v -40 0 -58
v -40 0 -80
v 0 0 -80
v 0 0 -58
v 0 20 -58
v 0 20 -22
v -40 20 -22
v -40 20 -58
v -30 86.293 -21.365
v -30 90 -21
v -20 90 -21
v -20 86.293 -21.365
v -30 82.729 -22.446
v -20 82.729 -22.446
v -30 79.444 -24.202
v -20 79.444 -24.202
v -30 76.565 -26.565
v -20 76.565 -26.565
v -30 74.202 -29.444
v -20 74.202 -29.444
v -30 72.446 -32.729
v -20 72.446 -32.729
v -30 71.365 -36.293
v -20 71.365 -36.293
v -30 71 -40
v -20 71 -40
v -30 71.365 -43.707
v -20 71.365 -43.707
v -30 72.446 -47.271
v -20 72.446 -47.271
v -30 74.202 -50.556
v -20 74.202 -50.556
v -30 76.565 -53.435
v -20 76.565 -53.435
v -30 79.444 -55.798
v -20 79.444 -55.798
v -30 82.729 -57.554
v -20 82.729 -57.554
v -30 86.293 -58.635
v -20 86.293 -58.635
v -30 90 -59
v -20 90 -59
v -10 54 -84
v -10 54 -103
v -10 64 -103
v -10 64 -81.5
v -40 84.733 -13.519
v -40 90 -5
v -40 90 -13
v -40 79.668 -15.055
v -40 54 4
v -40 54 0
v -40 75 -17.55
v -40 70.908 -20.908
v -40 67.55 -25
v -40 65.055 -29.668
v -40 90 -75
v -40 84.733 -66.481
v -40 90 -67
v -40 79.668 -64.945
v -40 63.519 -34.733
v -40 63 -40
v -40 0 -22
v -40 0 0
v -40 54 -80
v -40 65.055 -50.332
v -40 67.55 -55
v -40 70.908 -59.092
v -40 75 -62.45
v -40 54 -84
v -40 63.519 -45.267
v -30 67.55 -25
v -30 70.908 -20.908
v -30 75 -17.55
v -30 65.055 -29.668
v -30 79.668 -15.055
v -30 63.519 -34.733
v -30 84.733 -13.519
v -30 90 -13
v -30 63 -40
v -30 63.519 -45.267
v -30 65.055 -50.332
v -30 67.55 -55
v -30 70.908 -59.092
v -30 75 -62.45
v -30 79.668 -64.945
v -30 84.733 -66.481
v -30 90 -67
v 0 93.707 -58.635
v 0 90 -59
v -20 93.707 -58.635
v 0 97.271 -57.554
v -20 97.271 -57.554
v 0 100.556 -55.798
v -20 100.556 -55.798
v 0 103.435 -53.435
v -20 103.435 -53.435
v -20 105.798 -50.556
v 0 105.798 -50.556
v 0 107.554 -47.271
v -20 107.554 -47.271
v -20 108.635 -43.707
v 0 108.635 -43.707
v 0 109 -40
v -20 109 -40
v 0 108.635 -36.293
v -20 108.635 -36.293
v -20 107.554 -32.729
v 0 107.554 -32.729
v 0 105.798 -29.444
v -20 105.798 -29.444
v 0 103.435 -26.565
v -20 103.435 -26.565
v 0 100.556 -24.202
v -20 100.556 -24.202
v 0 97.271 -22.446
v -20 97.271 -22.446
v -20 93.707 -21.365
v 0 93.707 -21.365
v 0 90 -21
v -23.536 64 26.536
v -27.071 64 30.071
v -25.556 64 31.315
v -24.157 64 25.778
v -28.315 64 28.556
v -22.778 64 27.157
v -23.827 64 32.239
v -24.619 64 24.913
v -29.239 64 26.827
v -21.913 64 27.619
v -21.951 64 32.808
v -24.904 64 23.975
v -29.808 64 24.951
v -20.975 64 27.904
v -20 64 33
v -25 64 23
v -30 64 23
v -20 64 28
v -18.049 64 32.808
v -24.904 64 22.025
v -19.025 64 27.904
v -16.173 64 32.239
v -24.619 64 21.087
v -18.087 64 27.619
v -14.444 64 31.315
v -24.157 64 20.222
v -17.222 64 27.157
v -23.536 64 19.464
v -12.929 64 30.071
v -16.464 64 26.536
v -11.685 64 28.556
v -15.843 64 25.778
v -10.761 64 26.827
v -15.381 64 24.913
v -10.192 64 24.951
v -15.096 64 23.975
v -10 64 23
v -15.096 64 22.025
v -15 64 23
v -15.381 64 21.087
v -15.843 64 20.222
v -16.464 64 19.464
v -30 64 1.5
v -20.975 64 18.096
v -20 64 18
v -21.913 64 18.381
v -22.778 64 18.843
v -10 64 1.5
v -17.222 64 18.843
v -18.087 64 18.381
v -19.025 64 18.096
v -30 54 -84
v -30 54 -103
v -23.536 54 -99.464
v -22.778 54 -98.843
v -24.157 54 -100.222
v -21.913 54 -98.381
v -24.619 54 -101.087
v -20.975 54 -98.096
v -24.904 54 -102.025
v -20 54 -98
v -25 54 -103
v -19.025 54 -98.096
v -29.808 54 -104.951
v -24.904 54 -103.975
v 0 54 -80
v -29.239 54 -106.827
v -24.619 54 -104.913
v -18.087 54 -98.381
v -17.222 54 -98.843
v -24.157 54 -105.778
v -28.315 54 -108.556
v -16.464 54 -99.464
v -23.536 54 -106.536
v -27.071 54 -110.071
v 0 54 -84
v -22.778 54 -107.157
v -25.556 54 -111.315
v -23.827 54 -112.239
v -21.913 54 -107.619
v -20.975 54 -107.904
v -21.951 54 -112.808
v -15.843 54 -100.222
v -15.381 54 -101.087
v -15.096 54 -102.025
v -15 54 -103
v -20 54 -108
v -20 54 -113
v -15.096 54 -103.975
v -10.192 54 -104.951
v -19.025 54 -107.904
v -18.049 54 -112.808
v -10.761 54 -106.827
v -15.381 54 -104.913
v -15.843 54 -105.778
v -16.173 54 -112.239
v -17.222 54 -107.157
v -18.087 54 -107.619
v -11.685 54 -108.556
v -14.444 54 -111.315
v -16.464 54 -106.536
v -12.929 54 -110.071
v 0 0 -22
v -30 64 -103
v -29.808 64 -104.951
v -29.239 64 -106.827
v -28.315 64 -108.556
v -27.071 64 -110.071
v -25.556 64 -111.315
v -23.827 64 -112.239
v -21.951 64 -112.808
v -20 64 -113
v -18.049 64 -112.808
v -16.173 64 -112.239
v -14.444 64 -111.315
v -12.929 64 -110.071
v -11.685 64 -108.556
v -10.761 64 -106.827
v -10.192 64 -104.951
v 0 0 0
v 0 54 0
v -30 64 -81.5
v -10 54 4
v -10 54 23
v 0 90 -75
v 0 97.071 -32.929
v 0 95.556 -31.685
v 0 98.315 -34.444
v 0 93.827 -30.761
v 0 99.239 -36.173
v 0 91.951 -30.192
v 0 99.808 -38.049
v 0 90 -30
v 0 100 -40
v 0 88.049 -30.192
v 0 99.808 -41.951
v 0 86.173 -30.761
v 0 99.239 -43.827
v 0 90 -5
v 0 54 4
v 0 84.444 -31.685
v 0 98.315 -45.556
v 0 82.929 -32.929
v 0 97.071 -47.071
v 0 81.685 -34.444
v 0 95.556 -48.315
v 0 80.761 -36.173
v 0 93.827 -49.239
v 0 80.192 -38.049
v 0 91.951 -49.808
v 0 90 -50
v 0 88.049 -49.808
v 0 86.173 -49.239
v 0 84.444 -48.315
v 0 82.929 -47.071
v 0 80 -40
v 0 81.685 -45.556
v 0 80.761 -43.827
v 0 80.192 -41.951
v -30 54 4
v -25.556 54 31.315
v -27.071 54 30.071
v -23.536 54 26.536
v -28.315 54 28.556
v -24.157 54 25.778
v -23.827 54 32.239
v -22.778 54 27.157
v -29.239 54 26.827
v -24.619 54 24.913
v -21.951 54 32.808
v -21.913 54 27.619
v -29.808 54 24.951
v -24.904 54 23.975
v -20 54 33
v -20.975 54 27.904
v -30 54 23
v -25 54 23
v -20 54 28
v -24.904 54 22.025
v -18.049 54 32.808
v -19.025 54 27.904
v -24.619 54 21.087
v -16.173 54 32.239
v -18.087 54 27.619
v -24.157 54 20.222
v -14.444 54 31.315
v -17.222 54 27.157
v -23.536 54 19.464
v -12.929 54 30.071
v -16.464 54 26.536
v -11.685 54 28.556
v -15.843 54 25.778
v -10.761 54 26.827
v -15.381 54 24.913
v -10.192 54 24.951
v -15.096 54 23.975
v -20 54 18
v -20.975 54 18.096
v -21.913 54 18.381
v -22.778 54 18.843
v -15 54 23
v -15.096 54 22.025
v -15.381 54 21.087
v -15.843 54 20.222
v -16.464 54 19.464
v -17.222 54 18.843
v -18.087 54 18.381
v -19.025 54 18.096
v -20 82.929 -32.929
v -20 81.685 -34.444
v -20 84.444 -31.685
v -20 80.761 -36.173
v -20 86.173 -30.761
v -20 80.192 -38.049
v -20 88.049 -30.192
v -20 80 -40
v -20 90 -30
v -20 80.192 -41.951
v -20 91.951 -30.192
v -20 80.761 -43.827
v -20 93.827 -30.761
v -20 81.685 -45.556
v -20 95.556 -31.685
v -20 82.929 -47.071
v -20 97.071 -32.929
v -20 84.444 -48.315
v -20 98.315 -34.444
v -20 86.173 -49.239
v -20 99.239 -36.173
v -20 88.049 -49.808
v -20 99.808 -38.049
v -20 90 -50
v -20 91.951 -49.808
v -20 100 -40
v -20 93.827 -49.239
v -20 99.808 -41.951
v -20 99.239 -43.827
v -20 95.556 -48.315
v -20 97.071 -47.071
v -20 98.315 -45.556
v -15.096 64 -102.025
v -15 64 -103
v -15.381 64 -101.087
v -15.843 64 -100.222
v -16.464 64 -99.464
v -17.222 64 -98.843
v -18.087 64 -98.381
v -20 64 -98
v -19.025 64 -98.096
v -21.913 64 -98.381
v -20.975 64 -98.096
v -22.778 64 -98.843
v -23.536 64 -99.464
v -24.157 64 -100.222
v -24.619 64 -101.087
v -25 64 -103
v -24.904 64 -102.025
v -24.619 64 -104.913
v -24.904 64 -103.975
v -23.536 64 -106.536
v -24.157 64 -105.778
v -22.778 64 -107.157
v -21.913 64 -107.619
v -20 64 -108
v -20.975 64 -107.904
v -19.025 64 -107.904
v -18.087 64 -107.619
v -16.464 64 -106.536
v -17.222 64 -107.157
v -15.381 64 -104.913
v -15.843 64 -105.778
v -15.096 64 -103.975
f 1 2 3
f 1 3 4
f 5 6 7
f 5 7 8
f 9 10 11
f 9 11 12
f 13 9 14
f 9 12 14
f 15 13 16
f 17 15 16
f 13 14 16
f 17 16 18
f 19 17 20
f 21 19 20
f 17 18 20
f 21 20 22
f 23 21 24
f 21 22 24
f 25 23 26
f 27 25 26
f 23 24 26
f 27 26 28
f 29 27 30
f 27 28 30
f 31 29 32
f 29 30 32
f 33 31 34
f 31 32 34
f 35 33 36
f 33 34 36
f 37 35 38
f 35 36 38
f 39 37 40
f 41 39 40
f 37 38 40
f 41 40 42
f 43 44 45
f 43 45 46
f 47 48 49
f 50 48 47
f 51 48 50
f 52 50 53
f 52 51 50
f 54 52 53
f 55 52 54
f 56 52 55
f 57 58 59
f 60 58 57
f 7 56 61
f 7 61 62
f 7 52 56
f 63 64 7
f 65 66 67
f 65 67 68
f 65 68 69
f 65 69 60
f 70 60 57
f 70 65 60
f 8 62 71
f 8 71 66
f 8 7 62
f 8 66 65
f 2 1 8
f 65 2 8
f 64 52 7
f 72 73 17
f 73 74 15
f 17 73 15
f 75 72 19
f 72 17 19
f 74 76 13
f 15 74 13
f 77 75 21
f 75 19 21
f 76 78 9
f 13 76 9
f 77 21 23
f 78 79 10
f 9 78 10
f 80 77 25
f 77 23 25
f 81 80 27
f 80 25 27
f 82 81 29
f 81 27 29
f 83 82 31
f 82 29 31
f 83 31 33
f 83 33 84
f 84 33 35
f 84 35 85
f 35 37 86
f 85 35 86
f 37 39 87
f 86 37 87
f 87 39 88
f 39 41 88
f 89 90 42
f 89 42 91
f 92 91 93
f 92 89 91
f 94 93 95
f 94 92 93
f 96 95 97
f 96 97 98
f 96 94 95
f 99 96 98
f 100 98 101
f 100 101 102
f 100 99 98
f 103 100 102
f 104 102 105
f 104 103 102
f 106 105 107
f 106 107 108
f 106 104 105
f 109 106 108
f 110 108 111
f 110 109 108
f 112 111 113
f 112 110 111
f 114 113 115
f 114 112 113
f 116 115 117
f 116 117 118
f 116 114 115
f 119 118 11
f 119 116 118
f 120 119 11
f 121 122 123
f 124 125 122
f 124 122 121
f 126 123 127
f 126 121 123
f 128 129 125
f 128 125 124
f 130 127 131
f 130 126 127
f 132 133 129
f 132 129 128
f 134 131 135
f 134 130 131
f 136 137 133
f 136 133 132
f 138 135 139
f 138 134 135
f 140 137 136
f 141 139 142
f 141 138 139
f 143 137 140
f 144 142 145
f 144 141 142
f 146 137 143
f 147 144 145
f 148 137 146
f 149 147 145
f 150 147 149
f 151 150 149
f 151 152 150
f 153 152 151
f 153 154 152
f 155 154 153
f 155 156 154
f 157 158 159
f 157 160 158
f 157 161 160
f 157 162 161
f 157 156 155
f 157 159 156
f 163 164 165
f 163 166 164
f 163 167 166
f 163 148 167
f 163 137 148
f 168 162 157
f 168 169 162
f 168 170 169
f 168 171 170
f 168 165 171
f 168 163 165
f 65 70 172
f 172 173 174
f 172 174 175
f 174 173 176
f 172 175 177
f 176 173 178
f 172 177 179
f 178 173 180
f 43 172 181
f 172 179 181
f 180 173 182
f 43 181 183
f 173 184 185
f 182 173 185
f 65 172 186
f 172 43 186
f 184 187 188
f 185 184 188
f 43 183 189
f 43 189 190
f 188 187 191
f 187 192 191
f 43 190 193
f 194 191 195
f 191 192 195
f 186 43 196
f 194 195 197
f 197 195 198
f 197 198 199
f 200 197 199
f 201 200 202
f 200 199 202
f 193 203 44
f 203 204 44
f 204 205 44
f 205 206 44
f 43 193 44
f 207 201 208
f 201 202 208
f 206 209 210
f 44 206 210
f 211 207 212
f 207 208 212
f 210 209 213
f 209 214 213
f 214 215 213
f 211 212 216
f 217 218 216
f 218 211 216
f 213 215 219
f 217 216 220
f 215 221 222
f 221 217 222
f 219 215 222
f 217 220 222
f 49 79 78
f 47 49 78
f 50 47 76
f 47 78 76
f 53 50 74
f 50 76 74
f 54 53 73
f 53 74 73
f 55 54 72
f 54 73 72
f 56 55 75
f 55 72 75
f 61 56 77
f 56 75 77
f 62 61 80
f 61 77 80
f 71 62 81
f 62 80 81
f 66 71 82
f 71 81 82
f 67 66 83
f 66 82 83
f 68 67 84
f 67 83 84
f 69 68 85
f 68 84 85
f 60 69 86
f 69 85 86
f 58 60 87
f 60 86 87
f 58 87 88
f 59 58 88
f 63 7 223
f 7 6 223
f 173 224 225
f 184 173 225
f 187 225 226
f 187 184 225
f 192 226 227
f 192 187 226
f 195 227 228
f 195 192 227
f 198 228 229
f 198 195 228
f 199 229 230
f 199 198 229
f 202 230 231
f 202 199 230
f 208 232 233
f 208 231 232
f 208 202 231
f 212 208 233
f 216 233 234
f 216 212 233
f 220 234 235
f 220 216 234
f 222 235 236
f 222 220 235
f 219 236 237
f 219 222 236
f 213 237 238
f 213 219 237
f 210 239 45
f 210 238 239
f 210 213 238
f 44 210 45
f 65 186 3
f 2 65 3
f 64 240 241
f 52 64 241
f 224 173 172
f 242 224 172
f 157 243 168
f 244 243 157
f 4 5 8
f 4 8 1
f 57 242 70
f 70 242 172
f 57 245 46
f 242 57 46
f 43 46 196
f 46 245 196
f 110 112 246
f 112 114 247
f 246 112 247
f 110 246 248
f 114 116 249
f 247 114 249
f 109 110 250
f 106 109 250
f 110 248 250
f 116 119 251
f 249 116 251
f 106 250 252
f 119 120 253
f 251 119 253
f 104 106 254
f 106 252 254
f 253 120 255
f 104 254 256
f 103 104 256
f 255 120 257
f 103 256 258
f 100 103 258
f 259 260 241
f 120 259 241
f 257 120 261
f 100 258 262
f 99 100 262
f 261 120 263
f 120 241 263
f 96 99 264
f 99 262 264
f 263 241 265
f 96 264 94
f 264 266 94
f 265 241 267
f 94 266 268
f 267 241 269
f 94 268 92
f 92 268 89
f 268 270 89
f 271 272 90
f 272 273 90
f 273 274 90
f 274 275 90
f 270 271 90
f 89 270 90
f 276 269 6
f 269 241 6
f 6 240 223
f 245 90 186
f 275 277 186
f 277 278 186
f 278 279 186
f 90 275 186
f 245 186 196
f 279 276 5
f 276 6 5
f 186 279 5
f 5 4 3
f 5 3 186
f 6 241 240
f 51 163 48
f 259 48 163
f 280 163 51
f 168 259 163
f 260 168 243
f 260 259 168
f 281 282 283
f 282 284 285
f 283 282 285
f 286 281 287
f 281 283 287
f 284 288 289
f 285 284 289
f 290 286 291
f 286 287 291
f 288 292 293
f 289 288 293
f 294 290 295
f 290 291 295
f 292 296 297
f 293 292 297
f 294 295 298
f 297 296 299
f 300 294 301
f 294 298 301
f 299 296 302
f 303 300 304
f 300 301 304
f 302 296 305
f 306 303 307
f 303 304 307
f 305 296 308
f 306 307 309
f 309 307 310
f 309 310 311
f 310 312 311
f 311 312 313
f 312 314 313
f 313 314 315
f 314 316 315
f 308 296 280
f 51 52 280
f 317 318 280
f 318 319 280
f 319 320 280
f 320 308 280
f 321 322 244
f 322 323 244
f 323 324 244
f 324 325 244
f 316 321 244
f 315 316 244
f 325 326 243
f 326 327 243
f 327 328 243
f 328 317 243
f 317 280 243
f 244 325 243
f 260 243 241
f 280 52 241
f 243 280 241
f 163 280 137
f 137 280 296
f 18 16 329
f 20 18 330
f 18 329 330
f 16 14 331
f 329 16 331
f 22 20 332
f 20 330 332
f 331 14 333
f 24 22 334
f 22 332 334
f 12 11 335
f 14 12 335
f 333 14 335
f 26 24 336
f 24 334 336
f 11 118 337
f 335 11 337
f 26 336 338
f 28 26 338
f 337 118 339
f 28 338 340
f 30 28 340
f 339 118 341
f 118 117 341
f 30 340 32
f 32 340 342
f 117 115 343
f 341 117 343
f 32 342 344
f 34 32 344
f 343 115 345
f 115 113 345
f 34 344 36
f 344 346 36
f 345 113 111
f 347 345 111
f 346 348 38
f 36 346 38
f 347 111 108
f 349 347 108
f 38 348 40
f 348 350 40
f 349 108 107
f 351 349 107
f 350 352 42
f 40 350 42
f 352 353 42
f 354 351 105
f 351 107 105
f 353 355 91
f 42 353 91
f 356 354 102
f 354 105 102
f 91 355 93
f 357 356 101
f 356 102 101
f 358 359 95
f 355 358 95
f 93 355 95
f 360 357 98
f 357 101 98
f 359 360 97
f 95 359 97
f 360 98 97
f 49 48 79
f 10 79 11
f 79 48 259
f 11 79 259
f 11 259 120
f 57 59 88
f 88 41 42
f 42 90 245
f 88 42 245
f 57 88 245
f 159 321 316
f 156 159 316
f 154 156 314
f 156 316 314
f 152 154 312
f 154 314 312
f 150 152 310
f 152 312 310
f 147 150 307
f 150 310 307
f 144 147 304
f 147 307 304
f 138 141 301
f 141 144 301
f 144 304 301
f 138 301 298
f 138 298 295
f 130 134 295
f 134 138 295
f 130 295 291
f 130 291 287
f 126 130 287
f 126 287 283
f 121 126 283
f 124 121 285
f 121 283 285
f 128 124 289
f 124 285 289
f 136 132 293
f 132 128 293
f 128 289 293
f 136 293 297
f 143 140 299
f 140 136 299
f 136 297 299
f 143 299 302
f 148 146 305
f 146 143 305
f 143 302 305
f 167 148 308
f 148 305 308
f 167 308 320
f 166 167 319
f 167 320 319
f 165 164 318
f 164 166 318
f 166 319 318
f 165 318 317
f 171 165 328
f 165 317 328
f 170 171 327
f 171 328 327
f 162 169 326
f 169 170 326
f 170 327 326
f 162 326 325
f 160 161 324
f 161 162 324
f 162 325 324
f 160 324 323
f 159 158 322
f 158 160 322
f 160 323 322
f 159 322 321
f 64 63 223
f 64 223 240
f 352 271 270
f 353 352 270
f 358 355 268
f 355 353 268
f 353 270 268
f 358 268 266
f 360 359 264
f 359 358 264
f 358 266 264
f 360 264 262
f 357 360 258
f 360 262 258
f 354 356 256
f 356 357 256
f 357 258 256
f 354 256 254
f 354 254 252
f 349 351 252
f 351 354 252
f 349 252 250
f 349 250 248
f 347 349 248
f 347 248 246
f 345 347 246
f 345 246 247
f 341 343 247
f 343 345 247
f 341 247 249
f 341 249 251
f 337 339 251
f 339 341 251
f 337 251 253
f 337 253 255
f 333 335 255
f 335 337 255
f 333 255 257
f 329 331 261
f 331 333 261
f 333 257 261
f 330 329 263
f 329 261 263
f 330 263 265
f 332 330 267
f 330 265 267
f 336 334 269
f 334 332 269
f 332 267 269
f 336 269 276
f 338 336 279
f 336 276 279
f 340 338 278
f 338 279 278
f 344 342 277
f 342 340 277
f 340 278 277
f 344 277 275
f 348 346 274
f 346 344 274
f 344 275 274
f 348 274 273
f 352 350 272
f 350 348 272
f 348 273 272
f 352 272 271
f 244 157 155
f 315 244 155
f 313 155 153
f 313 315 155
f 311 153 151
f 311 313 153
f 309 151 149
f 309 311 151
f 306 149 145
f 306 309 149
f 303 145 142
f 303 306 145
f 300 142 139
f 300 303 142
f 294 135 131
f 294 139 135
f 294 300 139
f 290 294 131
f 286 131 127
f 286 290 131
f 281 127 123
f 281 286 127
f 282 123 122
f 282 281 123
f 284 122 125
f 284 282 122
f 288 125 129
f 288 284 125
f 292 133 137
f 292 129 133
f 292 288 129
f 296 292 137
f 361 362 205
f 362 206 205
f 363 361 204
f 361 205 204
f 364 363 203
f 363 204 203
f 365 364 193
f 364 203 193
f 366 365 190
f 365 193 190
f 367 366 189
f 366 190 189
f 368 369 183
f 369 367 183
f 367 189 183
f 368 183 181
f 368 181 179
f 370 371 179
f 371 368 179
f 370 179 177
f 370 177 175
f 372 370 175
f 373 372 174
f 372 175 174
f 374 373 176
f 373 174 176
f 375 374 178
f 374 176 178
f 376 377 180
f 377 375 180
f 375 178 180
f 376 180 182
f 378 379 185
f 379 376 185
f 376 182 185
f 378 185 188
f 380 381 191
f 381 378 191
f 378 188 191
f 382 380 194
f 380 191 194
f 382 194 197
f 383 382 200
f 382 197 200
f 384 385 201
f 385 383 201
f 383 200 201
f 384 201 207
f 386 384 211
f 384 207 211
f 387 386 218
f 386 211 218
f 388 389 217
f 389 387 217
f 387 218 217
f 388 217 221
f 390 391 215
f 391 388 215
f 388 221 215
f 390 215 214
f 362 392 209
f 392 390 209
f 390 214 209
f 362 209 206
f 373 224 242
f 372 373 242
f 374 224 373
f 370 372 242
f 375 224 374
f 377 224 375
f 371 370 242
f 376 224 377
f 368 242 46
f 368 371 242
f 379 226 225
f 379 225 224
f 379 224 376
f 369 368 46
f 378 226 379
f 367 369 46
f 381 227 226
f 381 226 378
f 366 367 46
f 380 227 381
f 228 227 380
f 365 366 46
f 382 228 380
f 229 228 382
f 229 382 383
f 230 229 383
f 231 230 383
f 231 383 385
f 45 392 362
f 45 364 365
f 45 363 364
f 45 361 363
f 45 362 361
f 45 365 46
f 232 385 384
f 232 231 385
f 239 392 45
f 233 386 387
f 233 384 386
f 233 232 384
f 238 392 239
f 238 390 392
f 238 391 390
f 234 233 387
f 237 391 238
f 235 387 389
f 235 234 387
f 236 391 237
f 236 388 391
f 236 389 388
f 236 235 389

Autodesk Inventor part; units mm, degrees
ref_plane "YZ Plane" through (0, 0, 0) normal (1, 0, 0) x (0, 1, 0)
ref_plane "XZ Plane" through (0, 0, 0) normal (0, 1, 0) x (-1, 0, 0)
ref_plane "XY Plane" through (0, 0, 0) normal (0, 0, 1) x (1, 0, 0)
sketch "Sketch1" plane through (0, 0, 0) normal (1, 0, 0) x (0, 1, 0)
  line L0 (0, 0) -> (54, 0)
  line L1 (54, 0) -> (54, -80)
  line L2 (54, -80) -> (0, -80)
  line L3 (0, -80) -> (0, 0)
  dimension "d0" = 80
  dimension "d1" = 54
extrude "Extrusion1" add sketch "Sketch1" against normal blind 40
sketch "Sketch2" plane through (0, 0, 0) normal (1, 0, 0) x (0, 0, -1)
  line L0 (22, 20) -> (58, 20)
  line L1 (0, 0) -> (80, 0) projected
  line L2 (0, 54) -> (80, 54) projected
  line L3 (40, 54) -> (40, 0)
  line L4 (22, 20) -> (22, 0)
  line L5 (58, 20) -> (58, 0)
  line L6 (22, 0) -> (58, 0)
  line L7 (80, 0) -> (0, 0) projected
  point P0 (40, 20)
  dimension "d4" = 36
  dimension "d5" = 20
extrude "Extrusion2" cut sketch "Sketch2" against normal blind 40
sketch "Sketch3" plane through (0, 54, 0) normal (0, 1, 0) x (1, 0, 0)
  line L0 (-40, 58) -> (-40, 22) projected
  line L1 (-40, 40) -> (0, 40)
  line L2 (0, 22) -> (0, 58) projected
  line L3 (0, 0) -> (-40, 0) projected
  line L4 (-20, 0) -> (-20, 80) construction
  line L5 (0, 80) -> (-40, 80) projected
  circle A0 centre (-20, 103) radius 5
  arc A1 (-10, 103) -> (-30, 103) centre (-20, 103) ccw
  line L6 (-40, 40) -> (-40, 103)
  line L7 (-40, 103) -> (-30, 103)
  line L8 (0, 40) -> (0, 103)
  line L9 (0, 103) -> (-10, 103)
  circle A2 centre (-20, -23) radius 5
  arc A3 (-30, -23) -> (-10, -23) centre (-20, -23) ccw
  line L10 (-40, 40) -> (-40, -23)
  line L11 (-40, -23) -> (-30, -23)
  line L12 (0, 40) -> (0, -23)
  line L13 (0, -23) -> (-10, -23)
  line L14 (-10, 103) -> (-10, -23)
  line L15 (-30, 103) -> (-30, -23)
  point P0 (-10, 0)
  point P1 (-30, 0)
  point P2 (-30, 80)
  point P3 (-10, 80)
  dimension "d8" = 10
  dimension "d9" = 20
  dimension "d10" = 126
  dimension "d11" = 10
extrude "Extrusion3" add sketch "Sketch3" along normal blind 74
sketch "Sketch4" plane through (0, 0, 0) normal (1, 0, 0) x (0, 0, -1)
  line L0 (-4, 54) -> (84, 54)
  line L1 (-23, 128) -> (103, 128) projected
  line L2 (40, 128) -> (40, 0)
  line L3 (58, 0) -> (80, 0) projected
  line L4 (84, 54) -> (84, 59)
  circle A0 centre (40, 90) radius 19
  circle A1 centre (40, 90) radius 10
  circle A2 centre (40, 90) radius 27
  line L5 (5, 90) -> (75, 90)
  line L6 (5, 90) -> (-4, 54)
  line L7 (75, 90) -> (84, 54)
  line L8 (-23, 54) -> (-33, 54) projected
  line L9 (113, 54) -> (113, 128) projected
  line L10 (113, 54) -> (103, 54) projected
  line L11 (-33, 54) -> (113, 54)
  line L12 (-23, 128) -> (-33, 128) projected
  line L13 (-33, 128) -> (113, 128)
  line L14 (-33, 128) -> (-33, 54)
  line L15 (-33, 54) -> (-33, 128) projected
  line L16 (13, 90) -> (67, 90)
  line L17 (13, 90) -> (67, 90)
  point P0 (0, 0)
  point P1 (40, 54)
  point P2 (59, 90)
  point P3 (21, 90)
  point P4 (30, 90)
  point P5 (50, 90)
  dimension "d14" = 88
  dimension "d15" = 54
  dimension "d16" = 5
  dimension "d17" = 38
  dimension "d18" = 20
  dimension "d22" = 70
  dimension "d23" = 36
  dimension "d28" = 54
extrude "Extrusion4" cut sketch "Sketch4" against normal blind 74 contours L11 L8 L14 L12 L1 L2 A2 L5 L6 | L7 L5 A2 L2 L1 L13 L9 L10 L11
extrude "Extrusion5" cut sketch "Sketch4" against normal blind 74 contours A2 L5 A0 L2 | L2 A0 L5 A2 | A2 L2 A0 L5 | A0 L5 A1 L2 | L2 A1 L5 A0 | L5 A0 L2 A2 | A0 L2 A1 L5 | A1 L5 L2 | L2 L5 A1 | L5 A1 L2 A0 | A1 L2 L5 | L2 A1 L5
extrude "Extrusion6" add sketch "Sketch4" against normal blind 30 contours A2 L5 A0 L2 | L2 A0 L5 A2 picked at (15.8923, 87.9973) picked at (64.1077, 87.9973)
extrude "Extrusion7" add sketch "Sketch4" against normal blind 20 contours A0 L5 A1 L2 | L2 A1 L5 A0 picked at (24.1588, 88.5907) picked at (55.7576, 87.849)
extrude "Extrusion8" add sketch "Sketch4" against normal blind 20 contours A0 L2 A1 L5 | L5 A1 L2 A0 picked at (24.8696, 94.899) picked at (53.2638, 98.775)
extrude "Extrusion9" add sketch "Sketch3" along normal blind 10 contours L15 A1 L14 L5 | L3 L14 A3 L15
properties part number "Baitap3"
